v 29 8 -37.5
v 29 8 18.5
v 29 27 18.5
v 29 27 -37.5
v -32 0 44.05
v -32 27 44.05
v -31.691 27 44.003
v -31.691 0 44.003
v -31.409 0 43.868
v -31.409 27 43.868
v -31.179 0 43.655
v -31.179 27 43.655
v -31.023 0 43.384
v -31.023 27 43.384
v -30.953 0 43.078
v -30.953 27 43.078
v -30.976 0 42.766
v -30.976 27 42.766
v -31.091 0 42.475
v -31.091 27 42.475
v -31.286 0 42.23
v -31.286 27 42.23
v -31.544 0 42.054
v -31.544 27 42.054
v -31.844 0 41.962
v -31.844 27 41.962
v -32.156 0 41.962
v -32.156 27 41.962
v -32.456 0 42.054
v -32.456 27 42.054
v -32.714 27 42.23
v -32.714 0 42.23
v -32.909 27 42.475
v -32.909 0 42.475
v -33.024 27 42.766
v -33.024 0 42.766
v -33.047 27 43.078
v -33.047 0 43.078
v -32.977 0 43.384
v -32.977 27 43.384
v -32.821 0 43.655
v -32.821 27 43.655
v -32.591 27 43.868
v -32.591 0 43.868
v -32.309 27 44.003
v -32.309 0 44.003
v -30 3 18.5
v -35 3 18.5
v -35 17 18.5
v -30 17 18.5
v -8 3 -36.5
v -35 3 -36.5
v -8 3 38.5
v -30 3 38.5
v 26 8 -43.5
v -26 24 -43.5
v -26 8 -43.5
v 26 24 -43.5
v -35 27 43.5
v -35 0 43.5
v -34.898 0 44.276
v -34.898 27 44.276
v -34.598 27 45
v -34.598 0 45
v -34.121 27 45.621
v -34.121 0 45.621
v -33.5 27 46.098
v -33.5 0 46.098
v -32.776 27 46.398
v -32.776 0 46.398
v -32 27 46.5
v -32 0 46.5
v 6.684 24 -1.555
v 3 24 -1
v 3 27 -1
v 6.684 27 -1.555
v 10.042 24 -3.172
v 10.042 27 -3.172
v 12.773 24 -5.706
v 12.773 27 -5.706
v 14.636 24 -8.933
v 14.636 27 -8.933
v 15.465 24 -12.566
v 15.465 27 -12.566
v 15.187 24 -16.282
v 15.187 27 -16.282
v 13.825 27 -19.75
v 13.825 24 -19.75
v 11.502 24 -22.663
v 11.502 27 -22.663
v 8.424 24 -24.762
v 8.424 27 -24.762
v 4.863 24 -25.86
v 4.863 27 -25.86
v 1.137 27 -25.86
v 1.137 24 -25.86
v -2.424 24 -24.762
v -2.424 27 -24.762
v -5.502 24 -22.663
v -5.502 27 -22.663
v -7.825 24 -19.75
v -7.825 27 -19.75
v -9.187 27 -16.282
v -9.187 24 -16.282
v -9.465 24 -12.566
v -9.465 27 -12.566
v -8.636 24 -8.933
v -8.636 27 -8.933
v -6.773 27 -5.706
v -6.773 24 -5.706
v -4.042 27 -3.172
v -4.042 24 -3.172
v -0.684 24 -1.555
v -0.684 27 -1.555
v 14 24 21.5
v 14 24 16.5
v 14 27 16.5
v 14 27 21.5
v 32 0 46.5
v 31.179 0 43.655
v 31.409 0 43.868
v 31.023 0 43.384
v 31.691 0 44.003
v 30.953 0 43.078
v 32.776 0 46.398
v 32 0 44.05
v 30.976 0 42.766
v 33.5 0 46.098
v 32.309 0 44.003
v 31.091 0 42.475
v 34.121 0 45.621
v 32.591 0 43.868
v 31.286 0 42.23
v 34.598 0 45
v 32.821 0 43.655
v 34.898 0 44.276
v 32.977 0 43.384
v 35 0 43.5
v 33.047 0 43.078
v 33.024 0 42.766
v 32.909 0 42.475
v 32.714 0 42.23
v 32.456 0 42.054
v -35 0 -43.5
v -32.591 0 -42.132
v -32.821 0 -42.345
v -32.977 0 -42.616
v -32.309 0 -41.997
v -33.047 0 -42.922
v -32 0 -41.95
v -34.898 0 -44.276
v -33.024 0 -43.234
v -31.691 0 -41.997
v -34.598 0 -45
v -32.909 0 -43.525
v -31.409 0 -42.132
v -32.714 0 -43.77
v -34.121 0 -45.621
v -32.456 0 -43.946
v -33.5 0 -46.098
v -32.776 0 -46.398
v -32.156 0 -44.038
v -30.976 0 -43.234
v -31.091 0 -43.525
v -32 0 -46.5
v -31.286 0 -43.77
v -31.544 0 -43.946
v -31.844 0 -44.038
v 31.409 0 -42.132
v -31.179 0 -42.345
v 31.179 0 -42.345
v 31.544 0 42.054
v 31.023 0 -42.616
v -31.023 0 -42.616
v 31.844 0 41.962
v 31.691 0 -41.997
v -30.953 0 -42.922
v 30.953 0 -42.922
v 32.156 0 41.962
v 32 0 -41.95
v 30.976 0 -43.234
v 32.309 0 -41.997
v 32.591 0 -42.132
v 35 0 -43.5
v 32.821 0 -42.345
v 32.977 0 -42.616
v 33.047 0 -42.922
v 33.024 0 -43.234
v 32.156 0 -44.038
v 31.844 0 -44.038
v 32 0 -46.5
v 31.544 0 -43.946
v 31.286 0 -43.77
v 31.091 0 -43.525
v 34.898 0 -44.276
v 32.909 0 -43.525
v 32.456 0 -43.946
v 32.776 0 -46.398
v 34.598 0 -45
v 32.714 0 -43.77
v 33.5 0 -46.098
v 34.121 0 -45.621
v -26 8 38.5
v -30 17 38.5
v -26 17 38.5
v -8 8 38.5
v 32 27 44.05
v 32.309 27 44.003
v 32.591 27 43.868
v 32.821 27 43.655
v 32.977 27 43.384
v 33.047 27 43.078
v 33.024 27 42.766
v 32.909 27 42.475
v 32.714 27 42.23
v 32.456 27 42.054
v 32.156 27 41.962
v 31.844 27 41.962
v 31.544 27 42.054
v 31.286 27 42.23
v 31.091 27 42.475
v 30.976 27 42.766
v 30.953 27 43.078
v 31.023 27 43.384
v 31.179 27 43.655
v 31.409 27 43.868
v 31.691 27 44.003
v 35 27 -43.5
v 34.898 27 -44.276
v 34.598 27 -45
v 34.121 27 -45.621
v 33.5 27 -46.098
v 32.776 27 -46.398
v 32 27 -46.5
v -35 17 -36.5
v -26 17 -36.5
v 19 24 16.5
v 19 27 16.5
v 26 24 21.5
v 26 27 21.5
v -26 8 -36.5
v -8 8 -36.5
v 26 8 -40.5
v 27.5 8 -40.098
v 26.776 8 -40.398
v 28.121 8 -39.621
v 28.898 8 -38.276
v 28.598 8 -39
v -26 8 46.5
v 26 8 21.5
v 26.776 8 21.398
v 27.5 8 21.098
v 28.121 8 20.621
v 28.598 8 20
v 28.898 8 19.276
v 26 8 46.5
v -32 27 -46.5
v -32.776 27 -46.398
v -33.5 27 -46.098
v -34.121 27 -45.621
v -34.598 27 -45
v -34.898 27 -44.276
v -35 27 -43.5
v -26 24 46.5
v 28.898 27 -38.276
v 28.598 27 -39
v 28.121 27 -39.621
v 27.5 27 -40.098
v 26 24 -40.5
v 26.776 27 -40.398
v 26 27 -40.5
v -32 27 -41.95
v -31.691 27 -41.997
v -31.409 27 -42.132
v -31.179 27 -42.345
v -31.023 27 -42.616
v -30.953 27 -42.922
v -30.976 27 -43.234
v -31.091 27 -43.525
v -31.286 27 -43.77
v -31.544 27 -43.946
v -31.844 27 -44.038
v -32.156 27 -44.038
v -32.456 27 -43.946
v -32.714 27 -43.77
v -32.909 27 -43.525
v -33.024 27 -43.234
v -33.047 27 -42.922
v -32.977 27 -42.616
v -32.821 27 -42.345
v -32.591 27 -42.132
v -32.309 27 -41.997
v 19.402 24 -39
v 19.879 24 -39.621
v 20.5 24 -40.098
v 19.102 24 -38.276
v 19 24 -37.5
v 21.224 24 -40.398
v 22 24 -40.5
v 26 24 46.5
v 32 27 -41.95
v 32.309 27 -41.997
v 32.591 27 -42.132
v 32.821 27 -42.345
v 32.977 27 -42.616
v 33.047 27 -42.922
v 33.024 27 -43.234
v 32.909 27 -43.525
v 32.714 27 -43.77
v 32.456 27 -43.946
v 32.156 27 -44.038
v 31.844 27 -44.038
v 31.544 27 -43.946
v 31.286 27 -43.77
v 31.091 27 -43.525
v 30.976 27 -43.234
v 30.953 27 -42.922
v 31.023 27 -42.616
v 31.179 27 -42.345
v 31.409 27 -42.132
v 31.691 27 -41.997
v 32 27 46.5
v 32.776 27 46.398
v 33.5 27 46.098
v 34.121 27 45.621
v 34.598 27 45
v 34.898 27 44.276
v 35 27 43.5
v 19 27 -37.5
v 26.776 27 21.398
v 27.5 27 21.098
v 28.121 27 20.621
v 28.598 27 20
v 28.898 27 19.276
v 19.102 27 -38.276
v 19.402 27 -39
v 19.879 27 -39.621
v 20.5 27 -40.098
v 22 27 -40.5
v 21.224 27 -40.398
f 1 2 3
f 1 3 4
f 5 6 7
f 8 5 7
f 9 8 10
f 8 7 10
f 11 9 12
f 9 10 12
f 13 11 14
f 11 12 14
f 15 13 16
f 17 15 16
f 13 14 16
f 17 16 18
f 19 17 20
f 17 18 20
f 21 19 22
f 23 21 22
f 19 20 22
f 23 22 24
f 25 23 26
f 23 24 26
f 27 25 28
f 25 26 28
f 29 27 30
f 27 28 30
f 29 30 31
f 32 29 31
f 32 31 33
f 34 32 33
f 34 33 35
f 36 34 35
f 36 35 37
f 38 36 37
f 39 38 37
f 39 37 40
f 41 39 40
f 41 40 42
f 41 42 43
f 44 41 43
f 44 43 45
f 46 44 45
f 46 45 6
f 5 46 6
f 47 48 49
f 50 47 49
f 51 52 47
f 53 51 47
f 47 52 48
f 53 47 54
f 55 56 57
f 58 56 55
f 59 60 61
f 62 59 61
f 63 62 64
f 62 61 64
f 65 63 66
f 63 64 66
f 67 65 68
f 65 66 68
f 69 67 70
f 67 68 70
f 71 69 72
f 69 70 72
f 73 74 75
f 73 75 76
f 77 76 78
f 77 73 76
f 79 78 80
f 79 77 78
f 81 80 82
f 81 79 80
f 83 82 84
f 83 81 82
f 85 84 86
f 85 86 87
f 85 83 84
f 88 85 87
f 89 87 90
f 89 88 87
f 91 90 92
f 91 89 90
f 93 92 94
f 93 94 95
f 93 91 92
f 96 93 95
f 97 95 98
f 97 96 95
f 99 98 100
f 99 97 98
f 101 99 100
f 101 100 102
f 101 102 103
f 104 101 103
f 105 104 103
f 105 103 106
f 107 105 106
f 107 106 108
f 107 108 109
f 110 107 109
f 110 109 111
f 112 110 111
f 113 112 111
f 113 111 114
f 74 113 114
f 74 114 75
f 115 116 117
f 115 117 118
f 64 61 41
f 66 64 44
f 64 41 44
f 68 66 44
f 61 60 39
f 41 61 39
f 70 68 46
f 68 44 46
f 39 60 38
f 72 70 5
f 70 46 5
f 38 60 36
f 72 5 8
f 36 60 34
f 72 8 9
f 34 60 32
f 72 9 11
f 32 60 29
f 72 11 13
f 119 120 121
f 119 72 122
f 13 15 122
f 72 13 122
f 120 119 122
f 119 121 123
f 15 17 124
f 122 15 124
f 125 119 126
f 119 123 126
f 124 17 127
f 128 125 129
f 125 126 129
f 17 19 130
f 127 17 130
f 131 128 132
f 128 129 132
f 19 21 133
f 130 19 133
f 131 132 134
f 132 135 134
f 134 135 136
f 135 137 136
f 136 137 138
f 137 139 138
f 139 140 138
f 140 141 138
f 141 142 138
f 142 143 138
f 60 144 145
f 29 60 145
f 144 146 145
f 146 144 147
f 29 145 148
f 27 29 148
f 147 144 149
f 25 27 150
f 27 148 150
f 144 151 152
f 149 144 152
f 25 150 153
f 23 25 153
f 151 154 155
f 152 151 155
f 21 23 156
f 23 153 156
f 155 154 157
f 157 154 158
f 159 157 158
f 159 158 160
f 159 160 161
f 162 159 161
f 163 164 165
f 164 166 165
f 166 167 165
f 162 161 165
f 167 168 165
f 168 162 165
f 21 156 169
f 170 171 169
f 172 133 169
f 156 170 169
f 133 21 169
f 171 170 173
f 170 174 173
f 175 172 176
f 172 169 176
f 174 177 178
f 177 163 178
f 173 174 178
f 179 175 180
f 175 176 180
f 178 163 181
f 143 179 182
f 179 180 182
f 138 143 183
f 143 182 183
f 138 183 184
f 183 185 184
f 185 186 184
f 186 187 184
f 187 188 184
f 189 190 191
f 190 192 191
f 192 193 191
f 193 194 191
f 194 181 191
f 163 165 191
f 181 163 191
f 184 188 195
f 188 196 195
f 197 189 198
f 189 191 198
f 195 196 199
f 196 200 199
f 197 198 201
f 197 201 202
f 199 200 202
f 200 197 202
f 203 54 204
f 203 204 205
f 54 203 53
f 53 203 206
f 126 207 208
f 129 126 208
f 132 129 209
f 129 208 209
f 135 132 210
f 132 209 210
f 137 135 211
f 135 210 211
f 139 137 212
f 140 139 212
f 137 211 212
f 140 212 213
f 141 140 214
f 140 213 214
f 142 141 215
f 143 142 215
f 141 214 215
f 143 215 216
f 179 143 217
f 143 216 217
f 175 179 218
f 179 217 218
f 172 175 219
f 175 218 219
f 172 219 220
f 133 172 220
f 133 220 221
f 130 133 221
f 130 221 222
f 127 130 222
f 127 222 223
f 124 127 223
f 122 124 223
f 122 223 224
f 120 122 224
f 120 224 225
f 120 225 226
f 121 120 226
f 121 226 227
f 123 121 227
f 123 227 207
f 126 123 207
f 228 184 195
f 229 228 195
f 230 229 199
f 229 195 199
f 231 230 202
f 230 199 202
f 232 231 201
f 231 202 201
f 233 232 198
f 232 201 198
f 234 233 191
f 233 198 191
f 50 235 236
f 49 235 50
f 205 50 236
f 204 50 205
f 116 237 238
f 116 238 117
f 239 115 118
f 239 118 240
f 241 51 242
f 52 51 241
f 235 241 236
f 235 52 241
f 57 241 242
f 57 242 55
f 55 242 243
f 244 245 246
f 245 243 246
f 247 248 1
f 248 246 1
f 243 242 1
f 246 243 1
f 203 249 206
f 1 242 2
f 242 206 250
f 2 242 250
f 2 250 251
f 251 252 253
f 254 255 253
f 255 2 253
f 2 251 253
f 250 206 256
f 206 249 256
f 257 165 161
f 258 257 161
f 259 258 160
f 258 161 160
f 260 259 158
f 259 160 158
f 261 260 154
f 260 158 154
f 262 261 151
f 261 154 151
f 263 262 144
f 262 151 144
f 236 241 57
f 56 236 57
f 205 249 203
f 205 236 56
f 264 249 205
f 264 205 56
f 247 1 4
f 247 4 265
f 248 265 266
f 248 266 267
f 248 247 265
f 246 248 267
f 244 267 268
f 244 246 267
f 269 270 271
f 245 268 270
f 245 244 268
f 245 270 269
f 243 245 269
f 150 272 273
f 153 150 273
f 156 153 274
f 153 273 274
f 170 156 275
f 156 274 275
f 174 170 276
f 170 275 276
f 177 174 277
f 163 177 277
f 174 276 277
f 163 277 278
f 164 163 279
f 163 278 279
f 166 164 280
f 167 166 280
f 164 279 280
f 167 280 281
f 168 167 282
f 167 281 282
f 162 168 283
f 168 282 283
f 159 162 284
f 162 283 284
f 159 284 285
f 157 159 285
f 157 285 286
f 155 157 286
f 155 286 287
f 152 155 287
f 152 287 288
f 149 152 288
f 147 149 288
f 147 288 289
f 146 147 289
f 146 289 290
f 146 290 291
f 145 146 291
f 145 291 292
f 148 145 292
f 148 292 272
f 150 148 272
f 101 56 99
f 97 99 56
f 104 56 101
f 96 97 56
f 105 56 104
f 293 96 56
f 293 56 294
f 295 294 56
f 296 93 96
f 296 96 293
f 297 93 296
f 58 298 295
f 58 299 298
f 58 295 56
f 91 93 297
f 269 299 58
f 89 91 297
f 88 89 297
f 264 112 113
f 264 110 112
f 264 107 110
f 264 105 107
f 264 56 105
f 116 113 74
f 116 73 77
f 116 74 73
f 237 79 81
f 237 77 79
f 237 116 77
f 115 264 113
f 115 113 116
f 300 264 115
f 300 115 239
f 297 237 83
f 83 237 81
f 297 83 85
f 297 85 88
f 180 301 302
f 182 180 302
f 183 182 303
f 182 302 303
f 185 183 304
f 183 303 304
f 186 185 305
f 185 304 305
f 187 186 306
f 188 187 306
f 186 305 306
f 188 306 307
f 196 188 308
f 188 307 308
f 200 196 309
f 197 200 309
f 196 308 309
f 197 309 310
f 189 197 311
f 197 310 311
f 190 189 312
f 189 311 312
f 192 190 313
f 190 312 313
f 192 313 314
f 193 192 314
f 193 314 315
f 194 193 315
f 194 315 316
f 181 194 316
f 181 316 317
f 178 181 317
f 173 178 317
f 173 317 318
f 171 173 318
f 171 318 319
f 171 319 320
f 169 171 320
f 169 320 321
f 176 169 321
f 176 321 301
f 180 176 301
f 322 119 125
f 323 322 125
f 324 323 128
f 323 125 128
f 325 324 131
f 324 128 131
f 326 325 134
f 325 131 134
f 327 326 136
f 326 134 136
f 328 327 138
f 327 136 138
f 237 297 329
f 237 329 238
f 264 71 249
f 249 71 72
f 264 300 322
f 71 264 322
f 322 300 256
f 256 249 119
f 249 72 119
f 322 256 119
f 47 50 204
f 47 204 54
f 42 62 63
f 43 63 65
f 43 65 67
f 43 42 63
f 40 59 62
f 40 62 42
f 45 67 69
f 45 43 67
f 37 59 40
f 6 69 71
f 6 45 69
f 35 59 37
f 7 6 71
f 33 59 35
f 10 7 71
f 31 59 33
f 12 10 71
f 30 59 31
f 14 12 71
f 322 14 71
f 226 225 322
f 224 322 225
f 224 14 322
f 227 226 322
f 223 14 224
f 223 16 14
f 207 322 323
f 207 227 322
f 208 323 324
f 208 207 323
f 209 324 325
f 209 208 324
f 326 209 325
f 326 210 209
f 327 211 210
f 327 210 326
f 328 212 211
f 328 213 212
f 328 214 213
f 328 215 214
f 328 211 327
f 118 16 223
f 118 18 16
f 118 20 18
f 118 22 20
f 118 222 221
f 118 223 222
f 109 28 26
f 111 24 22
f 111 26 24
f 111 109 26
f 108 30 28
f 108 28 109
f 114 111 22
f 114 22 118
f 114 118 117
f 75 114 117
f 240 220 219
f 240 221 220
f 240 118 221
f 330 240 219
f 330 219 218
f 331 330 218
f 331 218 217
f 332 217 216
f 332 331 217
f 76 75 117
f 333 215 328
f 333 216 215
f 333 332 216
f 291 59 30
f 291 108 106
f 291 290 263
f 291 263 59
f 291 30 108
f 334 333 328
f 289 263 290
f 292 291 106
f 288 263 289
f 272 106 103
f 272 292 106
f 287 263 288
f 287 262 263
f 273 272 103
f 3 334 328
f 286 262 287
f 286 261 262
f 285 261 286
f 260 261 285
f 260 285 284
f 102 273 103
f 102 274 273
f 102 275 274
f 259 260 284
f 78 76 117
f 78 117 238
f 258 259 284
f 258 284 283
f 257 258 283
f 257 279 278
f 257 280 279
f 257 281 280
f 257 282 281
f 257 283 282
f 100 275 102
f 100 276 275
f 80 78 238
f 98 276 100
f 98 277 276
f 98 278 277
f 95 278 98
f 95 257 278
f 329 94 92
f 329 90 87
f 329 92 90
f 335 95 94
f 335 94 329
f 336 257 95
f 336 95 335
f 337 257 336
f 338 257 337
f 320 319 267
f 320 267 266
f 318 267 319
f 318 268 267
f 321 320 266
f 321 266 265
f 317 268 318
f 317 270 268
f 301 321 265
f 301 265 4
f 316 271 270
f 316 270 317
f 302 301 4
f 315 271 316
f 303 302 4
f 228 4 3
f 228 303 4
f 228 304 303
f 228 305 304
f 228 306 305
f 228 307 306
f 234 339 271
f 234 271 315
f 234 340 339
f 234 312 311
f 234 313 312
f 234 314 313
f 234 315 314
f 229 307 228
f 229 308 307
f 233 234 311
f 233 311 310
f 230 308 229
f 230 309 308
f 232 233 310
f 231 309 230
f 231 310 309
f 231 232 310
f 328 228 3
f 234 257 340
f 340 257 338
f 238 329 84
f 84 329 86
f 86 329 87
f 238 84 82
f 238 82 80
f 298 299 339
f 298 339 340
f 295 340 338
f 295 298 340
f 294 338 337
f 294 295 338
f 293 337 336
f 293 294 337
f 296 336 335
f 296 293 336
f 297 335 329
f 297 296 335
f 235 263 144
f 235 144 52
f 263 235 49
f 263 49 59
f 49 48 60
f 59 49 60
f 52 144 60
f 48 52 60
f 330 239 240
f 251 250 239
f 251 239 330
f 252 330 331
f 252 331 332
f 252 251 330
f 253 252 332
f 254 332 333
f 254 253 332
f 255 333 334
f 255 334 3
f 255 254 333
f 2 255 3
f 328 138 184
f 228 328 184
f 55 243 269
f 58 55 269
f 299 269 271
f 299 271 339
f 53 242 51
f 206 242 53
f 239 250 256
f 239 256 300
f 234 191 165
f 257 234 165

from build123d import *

# Parameters (mm, degrees)
EXTRUDE_1_DEPTH     = 27
SKETCH_2_W          = 55
SKETCH_2_H          = 14
CUT_EXTRUDE_1_DEPTH = 27
SKETCH_3_W          = 52
SKETCH_3_H          = 16
CUT_EXTRUDE_2_DEPTH = 90
CUT_EXTRUDE_START   = -19
SKETCH_4_R          = 12.5
CUT_EXTRUDE_3_DEPTH = 19
CUT_EXTRUDE_4_DEPTH = 20
SKETCH_6_R          = 1.05
CUT_EXTRUDE_5_DEPTH = 65.158008074


with BuildPart() as part:
    # 草图1 → 凸台-拉伸1 (new body)
    with BuildSketch(Plane(origin=(0, 0, 0), x_dir=(1, 0, 0), z_dir=(0, 1, 0))):
        with BuildLine():
            Line((-32, -46.5), (32, -46.5))
            ThreePointArc((32, -46.5), (34.121320344, -45.621320344), (35, -43.5))
            Line((35, -43.5), (35, 43.5))
            ThreePointArc((35, 43.5), (34.121320344, 45.621320344), (32, 46.5))
            Line((32, 46.5), (-32, 46.5))
            ThreePointArc((-32, 46.5), (-34.121320344, 45.621320344), (-35, 43.5))
            Line((-35, 43.5), (-35, -43.5))
            ThreePointArc((-35, -43.5), (-34.121320344, -45.621320344), (-32, -46.5))
        make_face()
    extrude(amount=EXTRUDE_1_DEPTH)

    # 草图2 → 切除-拉伸1 (cut)
    with BuildSketch(Plane.ZY.offset(35)):
        with Locations((-9, 10)):
            Rectangle(SKETCH_2_W, SKETCH_2_H)
    extrude(amount=-CUT_EXTRUDE_1_DEPTH, mode=Mode.SUBTRACT)

    # 草图3 → 切除-拉伸2 (cut)
    with BuildSketch(Plane.XY.offset(46.5)):
        with Locations((0, 16)):
            Rectangle(SKETCH_3_W, SKETCH_3_H)
    extrude(amount=-CUT_EXTRUDE_2_DEPTH, mode=Mode.SUBTRACT)

    # 草图4 → 切除-拉伸3 (cut)
    with BuildSketch(Plane(origin=(0, 27, 0), x_dir=(1, 0, 0), z_dir=(0, 1, 0)).offset(CUT_EXTRUDE_START)):
        with Locations(Location((3, 13.5, 0), (0, 0, 270))):
            Circle(SKETCH_4_R)
        with BuildLine():
            Line((26, 40.5), (22, 40.5))
            ThreePointArc((22, 40.5), (19.878679656, 39.621320344), (19, 37.5))
            Line((19, 37.5), (19, -16.5))
            Line((19, -16.5), (14, -16.5))
            Line((14, -16.5), (14, -21.5))
            Line((14, -21.5), (19, -21.5))
            Line((19, -21.5), (26, -21.5))
            ThreePointArc((26, -21.5), (28.121320344, -20.621320344), (29, -18.5))
            Line((29, -18.5), (29, 37.5))
            ThreePointArc((29, 37.5), (28.121320344, 39.621320344), (26, 40.5))
        make_face()
    extrude(amount=CUT_EXTRUDE_3_DEPTH, mode=Mode.SUBTRACT)

    # 草图5 → 切除-拉伸4 (cut)
    with BuildSketch(Plane(origin=(0, 0, 18.5), x_dir=(-1, 0, 0), z_dir=(0, 0, -1))):
        Polygon((26, 17), (30, 17), (30, 3), (8, 3), (8, 8), (26, 8), align=None)
    extrude(amount=-CUT_EXTRUDE_4_DEPTH, mode=Mode.SUBTRACT)

    # 草图6 → 切除-拉伸5 (cut, through all)
    with BuildSketch(Plane(origin=(0, 27, 0), x_dir=(1, 0, 0), z_dir=(0, 1, 0))):
        with Locations(Location((-32, 43, 0), (0, 0, 270))):
            Circle(SKETCH_6_R)
        with Locations(Location((-32, -43, 0), (0, 0, 270))):
            Circle(SKETCH_6_R)
        with Locations(Location((32, -43, 0), (0, 0, 270))):
            Circle(SKETCH_6_R)
        with Locations(Location((32, 43, 0), (0, 0, 270))):
            Circle(SKETCH_6_R)
    extrude(amount=-CUT_EXTRUDE_5_DEPTH, mode=Mode.SUBTRACT)


solid = part.part
